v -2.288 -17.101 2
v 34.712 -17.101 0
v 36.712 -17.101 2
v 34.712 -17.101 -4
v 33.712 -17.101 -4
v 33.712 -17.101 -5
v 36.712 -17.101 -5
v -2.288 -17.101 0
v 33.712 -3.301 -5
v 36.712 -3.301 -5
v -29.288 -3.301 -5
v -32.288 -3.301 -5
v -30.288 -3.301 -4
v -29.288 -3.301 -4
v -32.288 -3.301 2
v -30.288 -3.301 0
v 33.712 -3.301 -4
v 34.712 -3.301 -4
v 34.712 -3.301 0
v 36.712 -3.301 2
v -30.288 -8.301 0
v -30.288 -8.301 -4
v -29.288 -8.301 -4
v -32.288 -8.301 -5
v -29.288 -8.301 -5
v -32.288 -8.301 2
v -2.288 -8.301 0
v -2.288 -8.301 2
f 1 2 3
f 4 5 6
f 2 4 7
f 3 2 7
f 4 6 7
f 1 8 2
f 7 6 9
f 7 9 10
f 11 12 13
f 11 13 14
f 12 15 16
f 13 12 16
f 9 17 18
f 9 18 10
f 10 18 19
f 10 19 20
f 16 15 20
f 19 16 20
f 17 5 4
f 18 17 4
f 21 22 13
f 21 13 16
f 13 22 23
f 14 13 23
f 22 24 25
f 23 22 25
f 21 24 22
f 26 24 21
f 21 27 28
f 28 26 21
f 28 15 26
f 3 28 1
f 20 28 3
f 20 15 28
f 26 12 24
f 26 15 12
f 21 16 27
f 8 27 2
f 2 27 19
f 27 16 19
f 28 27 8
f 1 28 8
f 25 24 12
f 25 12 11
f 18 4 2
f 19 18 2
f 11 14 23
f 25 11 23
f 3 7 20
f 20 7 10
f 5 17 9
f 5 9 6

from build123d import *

# Parameters (mm, degrees)
F0_W      = 69
F0_H      = 33.816832
F1_DEPTH  = 2
F2_W      = 30
F2_H      = 8.8
F3_DEPTH  = 25
F4_W      = 69
F4_H      = 20.016832
F5_DEPTH  = 25
F6_W      = 3
F6_H      = 5
F6_H_2    = 13.8
F7_DEPTH  = 5
F8_W      = 1
F8_H      = 4
F9_DEPTH  = 25
F10_W     = 1
F10_H     = 4
F11_DEPTH = 25


with BuildPart() as f1:
    # F0 (on Top) → F1 (new body)
    with BuildSketch(Plane.XY):
        with Locations((2.211537, -0.192308)):
            Rectangle(F0_W, F0_H)
    extrude(amount=F1_DEPTH)

    # F2 (on face) → F3 (cut)
    with BuildSketch(Plane(origin=(0, 0, 0), x_dir=(1, 0, 0), z_dir=(0, 0, -1))):
        with Locations((-17.288463, 12.700724)):
            Rectangle(F2_W, F2_H)
    extrude(amount=-F3_DEPTH, mode=Mode.SUBTRACT)

    # F4 (on face) → F5 (cut)
    with BuildSketch(Plane.XY.offset(2)):
        with Locations((2.211537, 6.707692)):
            Rectangle(F4_W, F4_H)
    extrude(amount=-F5_DEPTH, mode=Mode.SUBTRACT)

    # F6 (on face) → F7 (join)
    with BuildSketch(Plane(origin=(0, 0, 0), x_dir=(1, 0, 0), z_dir=(0, 0, -1))):
        with Locations((-30.788463, 5.800724)):
            Rectangle(F6_W, F6_H)
        with Locations((35.211537, 10.200724)):
            Rectangle(F6_W, F6_H_2)
    extrude(amount=F7_DEPTH)

    # F8 (on face) → F9 (cut)
    with BuildSketch(Plane.XZ.offset(17.100724)):
        with Locations((34.211537, -2)):
            Rectangle(F8_W, F8_H)
    extrude(amount=-F9_DEPTH, mode=Mode.SUBTRACT)

    # F10 (on face) → F11 (cut)
    with BuildSketch(Plane.XZ.offset(8.300724)):
        with Locations((-29.788463, -2)):
            Rectangle(F10_W, F10_H)
    extrude(amount=-F11_DEPTH, mode=Mode.SUBTRACT)


solid = f1.part
